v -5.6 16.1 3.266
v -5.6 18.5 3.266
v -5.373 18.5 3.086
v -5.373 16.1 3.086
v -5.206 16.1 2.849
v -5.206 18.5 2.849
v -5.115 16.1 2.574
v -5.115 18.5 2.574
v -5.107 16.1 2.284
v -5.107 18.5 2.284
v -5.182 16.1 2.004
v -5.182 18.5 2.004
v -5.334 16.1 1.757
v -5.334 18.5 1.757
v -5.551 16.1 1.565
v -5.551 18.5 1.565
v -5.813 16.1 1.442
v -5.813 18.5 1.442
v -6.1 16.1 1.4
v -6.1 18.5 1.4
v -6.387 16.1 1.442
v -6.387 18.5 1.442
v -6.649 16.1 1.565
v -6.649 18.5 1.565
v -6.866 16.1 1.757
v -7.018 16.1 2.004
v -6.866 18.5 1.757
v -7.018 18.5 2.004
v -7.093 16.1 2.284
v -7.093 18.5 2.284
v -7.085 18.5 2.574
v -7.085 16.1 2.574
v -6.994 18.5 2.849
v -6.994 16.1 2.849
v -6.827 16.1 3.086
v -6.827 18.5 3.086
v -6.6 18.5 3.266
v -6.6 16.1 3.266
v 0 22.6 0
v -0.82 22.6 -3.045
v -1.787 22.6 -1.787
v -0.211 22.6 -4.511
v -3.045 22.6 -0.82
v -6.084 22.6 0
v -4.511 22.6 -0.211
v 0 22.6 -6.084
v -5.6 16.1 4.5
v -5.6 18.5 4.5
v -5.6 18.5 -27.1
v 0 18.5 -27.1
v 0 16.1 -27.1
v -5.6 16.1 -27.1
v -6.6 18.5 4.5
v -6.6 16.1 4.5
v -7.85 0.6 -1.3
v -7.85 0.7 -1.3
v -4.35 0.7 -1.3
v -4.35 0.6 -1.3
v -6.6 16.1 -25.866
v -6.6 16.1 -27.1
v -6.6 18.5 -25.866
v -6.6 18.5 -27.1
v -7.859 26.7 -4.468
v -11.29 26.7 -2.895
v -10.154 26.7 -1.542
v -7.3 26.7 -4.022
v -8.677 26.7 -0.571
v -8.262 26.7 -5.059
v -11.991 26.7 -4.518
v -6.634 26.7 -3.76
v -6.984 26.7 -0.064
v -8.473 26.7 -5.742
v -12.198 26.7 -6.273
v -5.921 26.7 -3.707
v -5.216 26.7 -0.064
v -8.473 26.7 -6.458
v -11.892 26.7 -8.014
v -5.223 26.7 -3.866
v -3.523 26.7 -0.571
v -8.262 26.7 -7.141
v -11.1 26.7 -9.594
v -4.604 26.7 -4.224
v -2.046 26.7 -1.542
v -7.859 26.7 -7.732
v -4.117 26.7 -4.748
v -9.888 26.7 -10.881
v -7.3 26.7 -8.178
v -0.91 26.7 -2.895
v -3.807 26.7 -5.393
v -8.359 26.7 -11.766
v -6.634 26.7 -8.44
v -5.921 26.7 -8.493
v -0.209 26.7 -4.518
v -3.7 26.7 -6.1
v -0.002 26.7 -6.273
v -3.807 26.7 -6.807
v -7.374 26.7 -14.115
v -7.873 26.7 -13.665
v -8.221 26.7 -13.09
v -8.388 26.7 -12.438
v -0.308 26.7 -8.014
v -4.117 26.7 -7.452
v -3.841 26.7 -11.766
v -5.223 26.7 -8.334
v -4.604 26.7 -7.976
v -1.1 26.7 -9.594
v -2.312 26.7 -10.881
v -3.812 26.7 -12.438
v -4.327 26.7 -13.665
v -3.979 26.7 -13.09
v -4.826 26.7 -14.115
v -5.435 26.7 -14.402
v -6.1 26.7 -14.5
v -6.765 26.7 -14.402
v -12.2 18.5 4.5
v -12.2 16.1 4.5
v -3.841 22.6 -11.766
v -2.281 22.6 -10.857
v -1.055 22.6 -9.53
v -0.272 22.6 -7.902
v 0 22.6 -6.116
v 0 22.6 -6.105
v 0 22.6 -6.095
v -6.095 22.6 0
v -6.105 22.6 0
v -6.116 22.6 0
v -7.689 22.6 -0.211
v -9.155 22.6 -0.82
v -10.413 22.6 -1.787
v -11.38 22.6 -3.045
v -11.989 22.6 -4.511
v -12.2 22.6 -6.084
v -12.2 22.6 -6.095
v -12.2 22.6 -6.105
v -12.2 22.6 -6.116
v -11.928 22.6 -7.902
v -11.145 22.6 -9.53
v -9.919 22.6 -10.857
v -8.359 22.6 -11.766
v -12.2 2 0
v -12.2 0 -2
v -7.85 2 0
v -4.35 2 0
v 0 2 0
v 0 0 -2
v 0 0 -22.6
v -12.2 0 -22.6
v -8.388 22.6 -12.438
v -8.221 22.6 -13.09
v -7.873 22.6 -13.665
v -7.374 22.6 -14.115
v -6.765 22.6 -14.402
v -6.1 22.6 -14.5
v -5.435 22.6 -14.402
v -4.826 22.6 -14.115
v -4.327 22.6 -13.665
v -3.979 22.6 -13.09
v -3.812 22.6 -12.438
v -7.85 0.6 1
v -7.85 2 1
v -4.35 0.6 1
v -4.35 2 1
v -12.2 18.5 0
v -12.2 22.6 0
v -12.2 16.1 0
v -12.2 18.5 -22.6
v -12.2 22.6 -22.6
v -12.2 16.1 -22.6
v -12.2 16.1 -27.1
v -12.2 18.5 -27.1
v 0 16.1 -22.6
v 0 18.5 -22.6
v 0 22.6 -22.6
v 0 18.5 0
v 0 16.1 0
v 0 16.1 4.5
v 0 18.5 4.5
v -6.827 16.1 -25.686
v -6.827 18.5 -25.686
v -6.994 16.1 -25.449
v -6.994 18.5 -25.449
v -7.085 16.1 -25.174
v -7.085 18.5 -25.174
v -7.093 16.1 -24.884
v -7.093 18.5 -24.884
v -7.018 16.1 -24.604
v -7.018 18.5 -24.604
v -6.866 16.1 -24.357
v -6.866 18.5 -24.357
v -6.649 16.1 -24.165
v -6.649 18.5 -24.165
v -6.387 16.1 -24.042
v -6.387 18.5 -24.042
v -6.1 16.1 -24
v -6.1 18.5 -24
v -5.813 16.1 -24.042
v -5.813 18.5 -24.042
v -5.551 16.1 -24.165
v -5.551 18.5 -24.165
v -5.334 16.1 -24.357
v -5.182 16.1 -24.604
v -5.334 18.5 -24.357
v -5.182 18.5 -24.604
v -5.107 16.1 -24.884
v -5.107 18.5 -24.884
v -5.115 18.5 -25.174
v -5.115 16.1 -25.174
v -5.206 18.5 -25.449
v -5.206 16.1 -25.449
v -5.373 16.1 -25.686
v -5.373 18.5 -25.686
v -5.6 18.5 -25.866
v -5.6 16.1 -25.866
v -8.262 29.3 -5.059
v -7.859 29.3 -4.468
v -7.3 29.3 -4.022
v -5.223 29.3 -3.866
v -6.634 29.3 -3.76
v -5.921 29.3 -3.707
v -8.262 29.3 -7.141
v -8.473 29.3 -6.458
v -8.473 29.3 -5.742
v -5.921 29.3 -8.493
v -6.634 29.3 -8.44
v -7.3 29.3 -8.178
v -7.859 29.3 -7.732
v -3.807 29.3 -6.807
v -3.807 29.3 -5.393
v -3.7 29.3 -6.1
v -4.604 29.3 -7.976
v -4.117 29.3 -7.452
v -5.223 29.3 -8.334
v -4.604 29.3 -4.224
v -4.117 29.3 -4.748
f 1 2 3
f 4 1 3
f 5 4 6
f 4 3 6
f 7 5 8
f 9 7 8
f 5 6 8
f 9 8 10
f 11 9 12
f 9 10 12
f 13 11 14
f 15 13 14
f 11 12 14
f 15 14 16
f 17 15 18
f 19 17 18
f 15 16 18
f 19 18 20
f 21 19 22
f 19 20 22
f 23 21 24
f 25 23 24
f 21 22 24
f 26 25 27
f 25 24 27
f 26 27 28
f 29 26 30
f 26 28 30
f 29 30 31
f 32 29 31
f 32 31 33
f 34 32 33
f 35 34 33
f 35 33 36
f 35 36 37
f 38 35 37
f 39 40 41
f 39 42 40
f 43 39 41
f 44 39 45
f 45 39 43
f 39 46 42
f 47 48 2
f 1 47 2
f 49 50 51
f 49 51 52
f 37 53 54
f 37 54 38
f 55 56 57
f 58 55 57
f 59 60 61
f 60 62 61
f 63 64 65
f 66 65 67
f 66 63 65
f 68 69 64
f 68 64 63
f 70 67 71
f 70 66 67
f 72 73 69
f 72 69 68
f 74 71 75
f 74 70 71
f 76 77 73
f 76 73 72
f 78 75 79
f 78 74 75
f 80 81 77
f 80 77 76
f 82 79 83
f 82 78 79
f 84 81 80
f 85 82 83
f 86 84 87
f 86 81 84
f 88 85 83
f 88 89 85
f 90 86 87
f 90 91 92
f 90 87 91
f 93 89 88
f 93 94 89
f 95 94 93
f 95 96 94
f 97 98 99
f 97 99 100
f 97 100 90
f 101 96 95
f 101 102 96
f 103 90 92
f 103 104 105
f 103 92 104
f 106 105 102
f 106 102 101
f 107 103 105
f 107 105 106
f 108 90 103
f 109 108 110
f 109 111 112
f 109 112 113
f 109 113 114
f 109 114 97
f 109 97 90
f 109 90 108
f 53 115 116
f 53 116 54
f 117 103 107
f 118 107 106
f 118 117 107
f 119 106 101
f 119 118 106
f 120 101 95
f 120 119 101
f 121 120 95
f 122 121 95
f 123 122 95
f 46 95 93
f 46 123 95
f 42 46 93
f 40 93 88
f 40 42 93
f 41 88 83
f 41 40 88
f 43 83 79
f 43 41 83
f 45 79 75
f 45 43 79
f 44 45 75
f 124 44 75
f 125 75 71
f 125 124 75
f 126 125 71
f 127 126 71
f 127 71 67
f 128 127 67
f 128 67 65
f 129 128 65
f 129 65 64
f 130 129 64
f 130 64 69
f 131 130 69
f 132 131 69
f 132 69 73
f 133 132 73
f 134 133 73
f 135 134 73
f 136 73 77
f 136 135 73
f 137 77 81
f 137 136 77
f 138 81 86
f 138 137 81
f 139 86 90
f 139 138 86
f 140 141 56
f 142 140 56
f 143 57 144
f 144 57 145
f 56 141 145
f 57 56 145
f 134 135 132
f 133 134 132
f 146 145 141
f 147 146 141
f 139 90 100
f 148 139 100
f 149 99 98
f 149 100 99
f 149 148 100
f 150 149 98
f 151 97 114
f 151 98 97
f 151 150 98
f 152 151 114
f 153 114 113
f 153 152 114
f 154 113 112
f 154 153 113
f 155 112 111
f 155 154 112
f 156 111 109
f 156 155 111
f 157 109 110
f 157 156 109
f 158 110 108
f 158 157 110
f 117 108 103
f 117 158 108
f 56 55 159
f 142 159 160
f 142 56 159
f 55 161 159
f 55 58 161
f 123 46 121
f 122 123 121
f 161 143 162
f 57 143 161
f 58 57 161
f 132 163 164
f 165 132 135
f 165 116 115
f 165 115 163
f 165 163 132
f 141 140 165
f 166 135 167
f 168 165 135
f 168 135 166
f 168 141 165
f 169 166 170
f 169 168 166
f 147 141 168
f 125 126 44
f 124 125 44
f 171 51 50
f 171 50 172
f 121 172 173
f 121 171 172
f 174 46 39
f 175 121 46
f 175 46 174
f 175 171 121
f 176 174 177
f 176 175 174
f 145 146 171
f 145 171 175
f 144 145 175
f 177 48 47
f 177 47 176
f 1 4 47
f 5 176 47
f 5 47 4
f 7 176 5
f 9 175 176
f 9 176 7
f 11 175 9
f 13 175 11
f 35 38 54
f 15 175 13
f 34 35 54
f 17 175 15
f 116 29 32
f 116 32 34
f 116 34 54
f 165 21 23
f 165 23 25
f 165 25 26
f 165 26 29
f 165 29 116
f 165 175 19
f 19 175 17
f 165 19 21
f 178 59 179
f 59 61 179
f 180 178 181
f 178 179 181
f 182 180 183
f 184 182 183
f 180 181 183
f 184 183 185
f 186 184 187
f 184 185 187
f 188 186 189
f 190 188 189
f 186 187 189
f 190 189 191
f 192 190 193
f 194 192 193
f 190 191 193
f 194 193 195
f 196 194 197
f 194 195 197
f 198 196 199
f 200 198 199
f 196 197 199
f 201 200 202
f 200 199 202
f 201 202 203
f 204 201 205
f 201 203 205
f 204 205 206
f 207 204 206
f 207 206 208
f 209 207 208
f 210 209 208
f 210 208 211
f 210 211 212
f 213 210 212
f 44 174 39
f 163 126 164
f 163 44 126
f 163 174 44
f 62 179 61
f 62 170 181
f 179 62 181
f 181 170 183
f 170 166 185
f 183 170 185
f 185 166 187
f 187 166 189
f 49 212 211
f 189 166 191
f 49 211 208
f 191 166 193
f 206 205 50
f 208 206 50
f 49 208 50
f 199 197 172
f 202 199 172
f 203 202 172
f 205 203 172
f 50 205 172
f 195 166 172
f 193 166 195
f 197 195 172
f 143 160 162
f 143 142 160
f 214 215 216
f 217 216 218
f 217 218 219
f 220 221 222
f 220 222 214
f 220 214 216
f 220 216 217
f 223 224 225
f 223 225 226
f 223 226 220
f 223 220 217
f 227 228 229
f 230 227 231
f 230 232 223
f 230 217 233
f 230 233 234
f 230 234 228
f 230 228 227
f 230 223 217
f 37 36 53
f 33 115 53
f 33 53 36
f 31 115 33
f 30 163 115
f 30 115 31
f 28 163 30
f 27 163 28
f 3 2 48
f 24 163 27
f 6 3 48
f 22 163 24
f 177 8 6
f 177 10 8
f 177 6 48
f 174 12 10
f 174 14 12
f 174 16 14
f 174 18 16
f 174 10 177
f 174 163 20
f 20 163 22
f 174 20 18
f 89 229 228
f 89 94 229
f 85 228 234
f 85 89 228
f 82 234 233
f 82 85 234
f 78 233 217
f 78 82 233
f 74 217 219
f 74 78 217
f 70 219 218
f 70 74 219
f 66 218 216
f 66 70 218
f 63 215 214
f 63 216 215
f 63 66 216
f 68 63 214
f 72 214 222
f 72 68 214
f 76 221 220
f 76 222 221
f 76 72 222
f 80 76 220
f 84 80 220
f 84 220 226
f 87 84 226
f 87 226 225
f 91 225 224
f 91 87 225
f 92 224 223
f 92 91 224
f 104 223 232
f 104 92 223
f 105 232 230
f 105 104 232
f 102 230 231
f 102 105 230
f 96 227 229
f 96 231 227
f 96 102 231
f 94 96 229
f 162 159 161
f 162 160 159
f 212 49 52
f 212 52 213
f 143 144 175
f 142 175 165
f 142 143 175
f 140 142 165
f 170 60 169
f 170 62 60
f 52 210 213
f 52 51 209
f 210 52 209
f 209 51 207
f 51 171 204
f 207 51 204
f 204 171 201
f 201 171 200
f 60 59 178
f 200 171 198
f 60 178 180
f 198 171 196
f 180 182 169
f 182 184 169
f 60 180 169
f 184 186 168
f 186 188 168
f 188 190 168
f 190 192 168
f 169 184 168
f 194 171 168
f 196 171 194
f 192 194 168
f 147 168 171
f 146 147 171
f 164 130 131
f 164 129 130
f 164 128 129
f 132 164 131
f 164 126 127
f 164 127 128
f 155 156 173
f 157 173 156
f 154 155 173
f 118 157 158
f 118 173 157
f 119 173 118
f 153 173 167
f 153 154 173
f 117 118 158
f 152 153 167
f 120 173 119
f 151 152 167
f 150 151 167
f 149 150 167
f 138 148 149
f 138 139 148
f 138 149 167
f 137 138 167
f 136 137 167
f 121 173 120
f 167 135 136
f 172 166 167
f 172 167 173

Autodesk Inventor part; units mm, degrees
ref_plane "YZ Plane" through (0, 0, 0) normal (1, 0, 0) x (0, 1, 0)
ref_plane "XZ Plane" through (0, 0, 0) normal (0, 1, 0) x (-1, 0, 0)
ref_plane "XY Plane" through (0, 0, 0) normal (0, 0, 1) x (1, 0, 0)
sketch "Szkic1" plane through (0, 0, 0) normal (0, 1, 0) x (-1, 0, 0)
  line L0 (0, 0) -> (12.2, 0)
  line L1 (12.2, 0) -> (12.2, -22.6)
  line L2 (12.2, -22.6) -> (0, -22.6)
  line L3 (0, -22.6) -> (0, 0)
  dimension "d0" = 12.2
  dimension "d1" = 22.6
extrude "Wyciągnięcie proste1" add sketch "Szkic1" along normal blind 22.6
sketch "Szkic2" plane through (-12.2, 0, 0) normal (0, 0, 1) x (1, 0, 0)
  line L0 (0, 22.6) -> (12.2, 22.6) construction
  line L1 (0, 22.6) -> (0, 18.5) construction
  line L2 (0, 0) -> (0, 22.6) construction
  line L3 (0, 18.5) -> (12.2, 18.5) construction
  line L4 (12.2, 0) -> (12.2, 22.6) construction
  line L5 (0, 18.5) -> (0, 16.1) construction
  line L6 (0, 18.5) -> (12.2, 18.5)
  line L7 (12.2, 18.5) -> (12.2, 16.1)
  line L8 (12.2, 16.1) -> (0, 16.1)
  line L9 (0, 16.1) -> (0, 18.5)
  dimension "d4" = 4.1
  dimension "d5" = 2.4
extrude "Wyciągnięcie proste2" add sketch "Szkic2" along normal blind 4.5
sketch "Szkic3" plane through (0, 0, -22.6) normal (0, 0, -1) x (-1, 0, 0)
  line L0 (12.2, 18.5) -> (0, 18.5) projected
  line L1 (0, 16.1) -> (12.2, 16.1) projected
  line L2 (12.2, 0) -> (12.2, 22.6) projected
  line L3 (0, 0) -> (0, 22.6) projected
  line L4 (12.2, 18.5) -> (0, 18.5)
  line L5 (0, 18.5) -> (0, 16.1)
  line L6 (0, 16.1) -> (12.2, 16.1)
  line L7 (12.2, 16.1) -> (12.2, 18.5)
extrude "Wyciągnięcie proste3" add sketch "Szkic3" along normal blind 4.5
sketch "Szkic4" plane through (-12.2, 18.5, 0) normal (0, 1, 0) x (1, 0, 0)
  line L0 (0, -4.5) -> (12.2, -4.5) construction
  line L1 (6.1, -4.5) -> (6.1, 27) construction
  line L2 (6.1, -4.5) -> (5.6, -4.5) construction
  line L3 (6.1, -4.5) -> (6.1, -2.4) construction
  circle A0 centre (6.1, -2.4) radius 1 construction
  line L4 (5.6, -4.5) -> (6.6, -4.5) construction
  line L5 (6.6, -4.5) -> (6.6, -3) construction
  line L6 (6.6, -3) -> (5.6, -3) construction
  line L7 (5.6, -3) -> (5.6, -4.5) construction
  line L8 (5.6, -4.5) -> (5.6, -3.266)
  line L9 (5.6, -4.5) -> (6.6, -4.5)
  line L10 (6.6, -4.5) -> (6.6, -3.266)
  arc A1 (6.6, -3.266) -> (5.6, -3.266) centre (6.1, -2.4) ccw
  line L11 (0, 22.6) -> (0, 0) construction
  line L12 (0, 11.3) -> (12.2, 11.3) construction
  line L13 (12.2, 0) -> (12.2, 22.6) construction
  circle A2 centre (6.1, 25) radius 1 construction
  line L14 (5.6, 27.1) -> (6.6, 27.1) construction
  line L15 (5.6, 27.1) -> (5.6, 25.866)
  line L16 (6.6, 27.1) -> (6.6, 25.866)
  line L17 (5.6, 27.1) -> (6.6, 27.1)
  line L18 (0, 27.1) -> (12.2, 27.1) projected
  arc A3 (5.6, 25.866) -> (6.6, 25.866) centre (6.1, 25) ccw
  dimension "d10" = 0.5
  dimension "d11" = 2.1
  dimension "d12" = 2
  dimension "d13" = 1
extrude "Wyciągnięcie proste4" cut sketch "Szkic4" against normal blind 2.4
sketch "Szkic5" plane through (0, 22.6, 0) normal (0, 1, 0) x (1, 0, 0)
  line L0 (-12.2, 0) -> (0, 0) construction
  line L1 (-6.1, 0) -> (-6.1, 6.1) construction
  circle A0 centre (-6.1, 6.1) radius 6.1 construction
  line L2 (-6.1, 0) -> (-6.1, 14.5) construction
  circle A1 centre (-6.1, 12.2) radius 2.3 construction
  arc A2 (-8.3588, 11.7664) -> (-3.8412, 11.7664) centre (-6.1, 6.1) ccw
  arc A3 (-3.8412, 11.7664) -> (-8.3588, 11.7664) centre (-6.1, 12.2) ccw
  dimension "d16" = 6.1
  dimension "d17" = 12.2
  dimension "d18" = 14.5
extrude "Wyciągnięcie proste5" add sketch "Szkic5" along normal blind 4.1
sketch "Szkic6" plane through (0, 26.7, 0) normal (0, 1, 0) x (1, 0, 0)
  arc A0 (-8.3588, 11.7664) -> (-3.8412, 11.7664) centre (-6.1, 6.1) ccw projected
  circle A1 centre (-6.1, 6.1) radius 2.4
  point P0 (0, 0)
  dimension "d21" = 4.8
extrude "Wyciągnięcie proste6" add sketch "Szkic6" along normal blind 2.6
chamfer "Faza1" distance 2 angle 45 1 edges at (-6.1, 0, 0)
sketch "Szkic7" plane through (-12.2, 16.1, 0) normal (0, 0, 1) x (1, 0, 0)
  line L0 (12.2, -14.1) -> (0, -14.1) construction
  line L1 (6.1, -14.1) -> (6.1, -16.1) construction
  line L2 (0, -16.1) -> (12.2, -16.1) construction
  line L3 (6.1, -14.1) -> (4.35, -14.1) construction
  line L4 (4.35, -14.1) -> (7.85, -14.1)
  line L5 (7.85, -14.1) -> (7.85, -15.5)
  line L6 (7.85, -15.5) -> (4.35, -15.5)
  line L7 (4.35, -15.5) -> (4.35, -14.1)
  dimension "d27" = 1.75
  dimension "d28" = 3.5
  dimension "d29" = 1.4
extrude "Wyciągnięcie proste7" add sketch "Szkic7" along normal blind 1 and the other way blind 1.3
properties part number "SG92r"
